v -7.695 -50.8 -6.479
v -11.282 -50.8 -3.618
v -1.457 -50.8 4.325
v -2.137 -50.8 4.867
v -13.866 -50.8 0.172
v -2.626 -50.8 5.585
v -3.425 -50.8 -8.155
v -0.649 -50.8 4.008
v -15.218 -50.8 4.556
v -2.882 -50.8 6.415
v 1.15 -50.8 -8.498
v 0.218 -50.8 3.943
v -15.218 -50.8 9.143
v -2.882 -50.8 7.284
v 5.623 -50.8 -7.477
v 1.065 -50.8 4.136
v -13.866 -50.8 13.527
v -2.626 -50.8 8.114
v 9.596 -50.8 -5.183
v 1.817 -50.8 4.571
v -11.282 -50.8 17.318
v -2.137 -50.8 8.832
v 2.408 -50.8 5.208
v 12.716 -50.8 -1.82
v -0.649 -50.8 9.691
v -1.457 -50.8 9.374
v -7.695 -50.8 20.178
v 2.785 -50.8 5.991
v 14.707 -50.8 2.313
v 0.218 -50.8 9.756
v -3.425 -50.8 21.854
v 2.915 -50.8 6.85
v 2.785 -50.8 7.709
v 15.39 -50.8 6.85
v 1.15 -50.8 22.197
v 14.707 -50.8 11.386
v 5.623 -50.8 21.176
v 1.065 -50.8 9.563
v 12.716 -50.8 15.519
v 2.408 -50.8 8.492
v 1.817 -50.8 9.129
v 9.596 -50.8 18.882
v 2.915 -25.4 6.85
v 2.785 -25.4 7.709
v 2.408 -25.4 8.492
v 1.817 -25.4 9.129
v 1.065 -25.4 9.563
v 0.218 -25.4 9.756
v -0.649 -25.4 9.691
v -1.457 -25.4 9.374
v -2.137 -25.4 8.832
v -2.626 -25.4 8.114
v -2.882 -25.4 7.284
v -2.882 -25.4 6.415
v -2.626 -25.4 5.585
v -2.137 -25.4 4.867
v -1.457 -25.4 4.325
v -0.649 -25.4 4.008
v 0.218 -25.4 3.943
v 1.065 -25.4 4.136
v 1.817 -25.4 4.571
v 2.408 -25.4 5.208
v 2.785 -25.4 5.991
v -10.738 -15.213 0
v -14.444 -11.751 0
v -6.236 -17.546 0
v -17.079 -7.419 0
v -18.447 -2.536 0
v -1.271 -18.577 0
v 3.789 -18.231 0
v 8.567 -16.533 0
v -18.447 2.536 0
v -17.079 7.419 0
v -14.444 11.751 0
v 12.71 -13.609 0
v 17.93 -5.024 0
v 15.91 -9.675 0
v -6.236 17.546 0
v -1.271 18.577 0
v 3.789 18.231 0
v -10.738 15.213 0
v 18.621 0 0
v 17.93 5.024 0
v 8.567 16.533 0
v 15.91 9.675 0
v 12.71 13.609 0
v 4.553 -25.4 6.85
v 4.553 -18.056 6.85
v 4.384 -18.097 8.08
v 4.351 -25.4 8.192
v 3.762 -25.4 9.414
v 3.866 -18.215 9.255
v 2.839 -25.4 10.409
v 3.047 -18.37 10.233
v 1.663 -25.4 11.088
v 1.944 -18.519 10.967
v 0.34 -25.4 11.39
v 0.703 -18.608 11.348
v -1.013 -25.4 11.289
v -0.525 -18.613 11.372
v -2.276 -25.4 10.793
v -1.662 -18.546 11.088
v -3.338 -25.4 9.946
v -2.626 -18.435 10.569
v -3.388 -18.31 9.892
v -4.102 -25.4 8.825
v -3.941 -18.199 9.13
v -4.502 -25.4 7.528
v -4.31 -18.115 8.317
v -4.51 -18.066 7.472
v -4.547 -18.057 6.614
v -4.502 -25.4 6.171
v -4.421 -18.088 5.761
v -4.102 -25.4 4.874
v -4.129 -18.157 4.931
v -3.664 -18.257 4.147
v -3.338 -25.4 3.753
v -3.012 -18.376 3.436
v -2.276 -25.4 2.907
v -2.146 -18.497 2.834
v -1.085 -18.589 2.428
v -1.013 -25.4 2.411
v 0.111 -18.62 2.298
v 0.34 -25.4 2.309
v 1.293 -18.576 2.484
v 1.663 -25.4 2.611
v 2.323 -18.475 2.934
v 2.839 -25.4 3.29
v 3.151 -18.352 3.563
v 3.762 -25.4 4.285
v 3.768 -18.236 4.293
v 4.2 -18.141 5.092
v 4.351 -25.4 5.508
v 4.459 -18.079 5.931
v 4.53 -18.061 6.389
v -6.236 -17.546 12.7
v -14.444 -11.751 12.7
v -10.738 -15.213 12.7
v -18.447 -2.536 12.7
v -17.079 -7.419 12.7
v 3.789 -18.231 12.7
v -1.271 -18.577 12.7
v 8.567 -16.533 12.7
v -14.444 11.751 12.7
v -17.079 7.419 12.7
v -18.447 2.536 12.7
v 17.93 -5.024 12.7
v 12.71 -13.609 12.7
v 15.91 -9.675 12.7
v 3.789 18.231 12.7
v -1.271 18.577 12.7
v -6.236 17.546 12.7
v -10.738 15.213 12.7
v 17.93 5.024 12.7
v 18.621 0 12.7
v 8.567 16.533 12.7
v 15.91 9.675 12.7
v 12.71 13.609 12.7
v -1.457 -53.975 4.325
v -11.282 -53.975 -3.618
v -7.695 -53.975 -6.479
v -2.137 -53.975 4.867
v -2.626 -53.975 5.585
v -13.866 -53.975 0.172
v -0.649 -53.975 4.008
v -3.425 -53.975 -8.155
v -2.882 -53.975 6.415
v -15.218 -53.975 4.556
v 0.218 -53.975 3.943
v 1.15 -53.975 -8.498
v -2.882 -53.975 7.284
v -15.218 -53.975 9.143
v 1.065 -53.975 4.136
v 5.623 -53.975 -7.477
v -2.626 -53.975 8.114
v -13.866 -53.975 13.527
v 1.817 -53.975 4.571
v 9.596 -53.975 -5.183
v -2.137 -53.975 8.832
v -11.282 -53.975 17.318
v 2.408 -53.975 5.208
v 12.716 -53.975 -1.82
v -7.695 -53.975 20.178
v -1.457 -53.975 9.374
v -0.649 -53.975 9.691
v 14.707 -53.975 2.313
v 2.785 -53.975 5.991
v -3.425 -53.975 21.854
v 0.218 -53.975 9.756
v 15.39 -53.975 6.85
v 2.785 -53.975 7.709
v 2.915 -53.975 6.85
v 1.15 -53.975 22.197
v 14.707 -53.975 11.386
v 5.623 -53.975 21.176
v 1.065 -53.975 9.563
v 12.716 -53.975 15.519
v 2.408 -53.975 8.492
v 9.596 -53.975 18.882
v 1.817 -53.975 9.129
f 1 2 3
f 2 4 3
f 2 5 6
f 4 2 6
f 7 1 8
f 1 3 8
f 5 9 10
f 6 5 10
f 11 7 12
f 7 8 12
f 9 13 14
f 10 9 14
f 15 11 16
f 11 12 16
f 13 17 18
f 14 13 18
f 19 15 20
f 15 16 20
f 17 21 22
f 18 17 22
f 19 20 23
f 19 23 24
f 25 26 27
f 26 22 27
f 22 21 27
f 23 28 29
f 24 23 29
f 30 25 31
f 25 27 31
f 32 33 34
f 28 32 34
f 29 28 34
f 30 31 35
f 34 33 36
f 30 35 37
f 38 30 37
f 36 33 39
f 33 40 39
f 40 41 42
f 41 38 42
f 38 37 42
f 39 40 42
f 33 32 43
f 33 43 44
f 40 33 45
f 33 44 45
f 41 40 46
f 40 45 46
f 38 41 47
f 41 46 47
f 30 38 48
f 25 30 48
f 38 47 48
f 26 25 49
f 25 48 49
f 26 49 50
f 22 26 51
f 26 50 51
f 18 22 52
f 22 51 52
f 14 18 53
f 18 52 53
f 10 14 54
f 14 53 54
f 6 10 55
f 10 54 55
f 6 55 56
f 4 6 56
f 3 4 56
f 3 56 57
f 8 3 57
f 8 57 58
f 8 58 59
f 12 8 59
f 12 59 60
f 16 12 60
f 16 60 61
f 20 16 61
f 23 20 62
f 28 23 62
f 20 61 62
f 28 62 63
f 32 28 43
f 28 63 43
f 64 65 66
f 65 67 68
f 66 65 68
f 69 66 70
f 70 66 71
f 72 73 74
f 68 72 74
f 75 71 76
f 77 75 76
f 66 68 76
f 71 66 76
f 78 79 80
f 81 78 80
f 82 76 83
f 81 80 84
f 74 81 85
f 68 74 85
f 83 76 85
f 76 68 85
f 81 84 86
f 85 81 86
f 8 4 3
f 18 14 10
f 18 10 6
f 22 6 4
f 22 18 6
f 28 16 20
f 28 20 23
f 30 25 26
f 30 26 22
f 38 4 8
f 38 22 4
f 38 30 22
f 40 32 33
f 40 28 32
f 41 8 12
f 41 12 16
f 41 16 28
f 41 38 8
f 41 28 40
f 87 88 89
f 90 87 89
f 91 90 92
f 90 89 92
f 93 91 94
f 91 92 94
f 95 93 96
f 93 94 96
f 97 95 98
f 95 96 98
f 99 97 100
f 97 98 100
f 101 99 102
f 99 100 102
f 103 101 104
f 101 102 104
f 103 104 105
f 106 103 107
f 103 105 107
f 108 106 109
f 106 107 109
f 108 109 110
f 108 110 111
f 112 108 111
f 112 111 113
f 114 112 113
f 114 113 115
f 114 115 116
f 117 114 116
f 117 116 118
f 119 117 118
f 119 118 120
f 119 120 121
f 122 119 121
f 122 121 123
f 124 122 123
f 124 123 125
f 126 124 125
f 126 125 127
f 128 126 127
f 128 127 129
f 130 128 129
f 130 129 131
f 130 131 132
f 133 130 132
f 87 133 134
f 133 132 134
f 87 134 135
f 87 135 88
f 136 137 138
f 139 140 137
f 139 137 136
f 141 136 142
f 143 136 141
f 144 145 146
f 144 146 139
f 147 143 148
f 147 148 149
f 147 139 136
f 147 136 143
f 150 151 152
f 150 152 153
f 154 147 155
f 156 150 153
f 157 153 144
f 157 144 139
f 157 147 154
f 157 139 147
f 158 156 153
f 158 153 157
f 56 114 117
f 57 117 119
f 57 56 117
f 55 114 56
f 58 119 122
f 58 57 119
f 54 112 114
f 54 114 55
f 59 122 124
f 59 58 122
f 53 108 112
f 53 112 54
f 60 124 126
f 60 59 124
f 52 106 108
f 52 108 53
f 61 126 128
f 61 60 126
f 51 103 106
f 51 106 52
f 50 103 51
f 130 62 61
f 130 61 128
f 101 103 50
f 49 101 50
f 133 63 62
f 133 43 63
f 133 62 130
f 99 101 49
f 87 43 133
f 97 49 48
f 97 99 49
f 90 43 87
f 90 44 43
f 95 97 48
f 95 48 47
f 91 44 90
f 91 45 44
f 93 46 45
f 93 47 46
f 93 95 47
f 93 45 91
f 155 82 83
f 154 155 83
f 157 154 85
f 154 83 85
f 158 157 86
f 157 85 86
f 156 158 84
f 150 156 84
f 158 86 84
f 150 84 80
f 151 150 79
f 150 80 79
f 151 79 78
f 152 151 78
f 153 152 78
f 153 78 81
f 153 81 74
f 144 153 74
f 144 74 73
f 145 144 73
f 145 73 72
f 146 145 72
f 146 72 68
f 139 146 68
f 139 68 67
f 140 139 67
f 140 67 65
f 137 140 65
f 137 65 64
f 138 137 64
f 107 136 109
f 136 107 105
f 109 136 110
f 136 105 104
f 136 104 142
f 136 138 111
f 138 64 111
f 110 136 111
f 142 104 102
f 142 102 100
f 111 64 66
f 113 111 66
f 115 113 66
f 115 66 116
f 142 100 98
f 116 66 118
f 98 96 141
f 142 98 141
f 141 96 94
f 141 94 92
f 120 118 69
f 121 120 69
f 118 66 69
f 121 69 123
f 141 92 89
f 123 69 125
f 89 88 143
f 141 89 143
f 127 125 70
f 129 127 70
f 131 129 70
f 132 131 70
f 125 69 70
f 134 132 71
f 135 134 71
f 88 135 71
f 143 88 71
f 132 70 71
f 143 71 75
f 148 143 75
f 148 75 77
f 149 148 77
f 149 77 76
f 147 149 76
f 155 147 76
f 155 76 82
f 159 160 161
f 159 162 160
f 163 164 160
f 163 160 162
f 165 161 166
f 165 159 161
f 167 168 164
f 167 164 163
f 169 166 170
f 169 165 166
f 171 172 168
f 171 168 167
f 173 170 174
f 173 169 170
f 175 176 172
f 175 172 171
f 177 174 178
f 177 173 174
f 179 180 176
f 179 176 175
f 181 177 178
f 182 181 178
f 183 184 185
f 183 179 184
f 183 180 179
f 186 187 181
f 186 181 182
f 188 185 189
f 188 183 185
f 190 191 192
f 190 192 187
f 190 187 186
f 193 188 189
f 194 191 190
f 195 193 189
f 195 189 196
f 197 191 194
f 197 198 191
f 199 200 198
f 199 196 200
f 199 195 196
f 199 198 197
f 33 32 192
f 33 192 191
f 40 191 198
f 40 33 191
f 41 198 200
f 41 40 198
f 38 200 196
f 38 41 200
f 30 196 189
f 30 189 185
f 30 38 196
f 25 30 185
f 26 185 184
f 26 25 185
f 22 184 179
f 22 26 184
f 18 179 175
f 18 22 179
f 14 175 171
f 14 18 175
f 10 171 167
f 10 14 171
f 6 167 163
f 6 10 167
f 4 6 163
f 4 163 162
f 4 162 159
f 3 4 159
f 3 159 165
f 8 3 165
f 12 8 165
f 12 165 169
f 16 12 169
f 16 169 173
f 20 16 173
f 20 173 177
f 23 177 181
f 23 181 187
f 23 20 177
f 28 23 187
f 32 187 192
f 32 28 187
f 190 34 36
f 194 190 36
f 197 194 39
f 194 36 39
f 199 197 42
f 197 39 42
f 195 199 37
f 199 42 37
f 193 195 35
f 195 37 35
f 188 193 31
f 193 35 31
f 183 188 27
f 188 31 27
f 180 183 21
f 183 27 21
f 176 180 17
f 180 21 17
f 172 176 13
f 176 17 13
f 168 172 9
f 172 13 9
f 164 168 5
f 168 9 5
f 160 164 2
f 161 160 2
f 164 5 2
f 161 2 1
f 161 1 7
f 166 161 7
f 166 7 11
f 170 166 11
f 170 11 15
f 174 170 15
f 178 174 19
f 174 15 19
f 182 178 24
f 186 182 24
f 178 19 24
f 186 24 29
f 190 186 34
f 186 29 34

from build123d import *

# Parameters (mm, degrees)
F0_R     = 18.620809
F1_DEPTH = 12.7
F2_R     = 4.552994
F3_DEPTH = 25.4
F4_R     = 2.914756
F5_DEPTH = 25.4
F6_R     = 15.390344
F6_R_2   = 2.914756
F7_DEPTH = 3.175


with BuildPart() as f1:
    # F0 (on Top) → F1 (new body)
    with BuildSketch(Plane.XY):
        Circle(F0_R)
    extrude(amount=F1_DEPTH)

    # F2 (on Front) → F3 (join)
    with BuildSketch(Plane.XZ):
        with Locations((0, 6.849673)):
            Circle(F2_R)
    extrude(amount=F3_DEPTH)

    # F4 (on face) → F5 (join)
    with BuildSketch(Plane.XZ.offset(25.4)):
        with Locations((0, 6.849673)):
            Circle(F4_R)
    extrude(amount=F5_DEPTH)


with BuildPart() as f7:
    # F6 (on face) → F7 (new body)
    with BuildSketch(Plane.XZ.offset(50.8)):
        with Locations((0, 6.849673)):
            Circle(F6_R)
        with Locations((0, 6.849673)):
            Circle(F6_R_2, mode=Mode.SUBTRACT)
    extrude(amount=F7_DEPTH)


solid = Compound([f1.part, f7.part])
